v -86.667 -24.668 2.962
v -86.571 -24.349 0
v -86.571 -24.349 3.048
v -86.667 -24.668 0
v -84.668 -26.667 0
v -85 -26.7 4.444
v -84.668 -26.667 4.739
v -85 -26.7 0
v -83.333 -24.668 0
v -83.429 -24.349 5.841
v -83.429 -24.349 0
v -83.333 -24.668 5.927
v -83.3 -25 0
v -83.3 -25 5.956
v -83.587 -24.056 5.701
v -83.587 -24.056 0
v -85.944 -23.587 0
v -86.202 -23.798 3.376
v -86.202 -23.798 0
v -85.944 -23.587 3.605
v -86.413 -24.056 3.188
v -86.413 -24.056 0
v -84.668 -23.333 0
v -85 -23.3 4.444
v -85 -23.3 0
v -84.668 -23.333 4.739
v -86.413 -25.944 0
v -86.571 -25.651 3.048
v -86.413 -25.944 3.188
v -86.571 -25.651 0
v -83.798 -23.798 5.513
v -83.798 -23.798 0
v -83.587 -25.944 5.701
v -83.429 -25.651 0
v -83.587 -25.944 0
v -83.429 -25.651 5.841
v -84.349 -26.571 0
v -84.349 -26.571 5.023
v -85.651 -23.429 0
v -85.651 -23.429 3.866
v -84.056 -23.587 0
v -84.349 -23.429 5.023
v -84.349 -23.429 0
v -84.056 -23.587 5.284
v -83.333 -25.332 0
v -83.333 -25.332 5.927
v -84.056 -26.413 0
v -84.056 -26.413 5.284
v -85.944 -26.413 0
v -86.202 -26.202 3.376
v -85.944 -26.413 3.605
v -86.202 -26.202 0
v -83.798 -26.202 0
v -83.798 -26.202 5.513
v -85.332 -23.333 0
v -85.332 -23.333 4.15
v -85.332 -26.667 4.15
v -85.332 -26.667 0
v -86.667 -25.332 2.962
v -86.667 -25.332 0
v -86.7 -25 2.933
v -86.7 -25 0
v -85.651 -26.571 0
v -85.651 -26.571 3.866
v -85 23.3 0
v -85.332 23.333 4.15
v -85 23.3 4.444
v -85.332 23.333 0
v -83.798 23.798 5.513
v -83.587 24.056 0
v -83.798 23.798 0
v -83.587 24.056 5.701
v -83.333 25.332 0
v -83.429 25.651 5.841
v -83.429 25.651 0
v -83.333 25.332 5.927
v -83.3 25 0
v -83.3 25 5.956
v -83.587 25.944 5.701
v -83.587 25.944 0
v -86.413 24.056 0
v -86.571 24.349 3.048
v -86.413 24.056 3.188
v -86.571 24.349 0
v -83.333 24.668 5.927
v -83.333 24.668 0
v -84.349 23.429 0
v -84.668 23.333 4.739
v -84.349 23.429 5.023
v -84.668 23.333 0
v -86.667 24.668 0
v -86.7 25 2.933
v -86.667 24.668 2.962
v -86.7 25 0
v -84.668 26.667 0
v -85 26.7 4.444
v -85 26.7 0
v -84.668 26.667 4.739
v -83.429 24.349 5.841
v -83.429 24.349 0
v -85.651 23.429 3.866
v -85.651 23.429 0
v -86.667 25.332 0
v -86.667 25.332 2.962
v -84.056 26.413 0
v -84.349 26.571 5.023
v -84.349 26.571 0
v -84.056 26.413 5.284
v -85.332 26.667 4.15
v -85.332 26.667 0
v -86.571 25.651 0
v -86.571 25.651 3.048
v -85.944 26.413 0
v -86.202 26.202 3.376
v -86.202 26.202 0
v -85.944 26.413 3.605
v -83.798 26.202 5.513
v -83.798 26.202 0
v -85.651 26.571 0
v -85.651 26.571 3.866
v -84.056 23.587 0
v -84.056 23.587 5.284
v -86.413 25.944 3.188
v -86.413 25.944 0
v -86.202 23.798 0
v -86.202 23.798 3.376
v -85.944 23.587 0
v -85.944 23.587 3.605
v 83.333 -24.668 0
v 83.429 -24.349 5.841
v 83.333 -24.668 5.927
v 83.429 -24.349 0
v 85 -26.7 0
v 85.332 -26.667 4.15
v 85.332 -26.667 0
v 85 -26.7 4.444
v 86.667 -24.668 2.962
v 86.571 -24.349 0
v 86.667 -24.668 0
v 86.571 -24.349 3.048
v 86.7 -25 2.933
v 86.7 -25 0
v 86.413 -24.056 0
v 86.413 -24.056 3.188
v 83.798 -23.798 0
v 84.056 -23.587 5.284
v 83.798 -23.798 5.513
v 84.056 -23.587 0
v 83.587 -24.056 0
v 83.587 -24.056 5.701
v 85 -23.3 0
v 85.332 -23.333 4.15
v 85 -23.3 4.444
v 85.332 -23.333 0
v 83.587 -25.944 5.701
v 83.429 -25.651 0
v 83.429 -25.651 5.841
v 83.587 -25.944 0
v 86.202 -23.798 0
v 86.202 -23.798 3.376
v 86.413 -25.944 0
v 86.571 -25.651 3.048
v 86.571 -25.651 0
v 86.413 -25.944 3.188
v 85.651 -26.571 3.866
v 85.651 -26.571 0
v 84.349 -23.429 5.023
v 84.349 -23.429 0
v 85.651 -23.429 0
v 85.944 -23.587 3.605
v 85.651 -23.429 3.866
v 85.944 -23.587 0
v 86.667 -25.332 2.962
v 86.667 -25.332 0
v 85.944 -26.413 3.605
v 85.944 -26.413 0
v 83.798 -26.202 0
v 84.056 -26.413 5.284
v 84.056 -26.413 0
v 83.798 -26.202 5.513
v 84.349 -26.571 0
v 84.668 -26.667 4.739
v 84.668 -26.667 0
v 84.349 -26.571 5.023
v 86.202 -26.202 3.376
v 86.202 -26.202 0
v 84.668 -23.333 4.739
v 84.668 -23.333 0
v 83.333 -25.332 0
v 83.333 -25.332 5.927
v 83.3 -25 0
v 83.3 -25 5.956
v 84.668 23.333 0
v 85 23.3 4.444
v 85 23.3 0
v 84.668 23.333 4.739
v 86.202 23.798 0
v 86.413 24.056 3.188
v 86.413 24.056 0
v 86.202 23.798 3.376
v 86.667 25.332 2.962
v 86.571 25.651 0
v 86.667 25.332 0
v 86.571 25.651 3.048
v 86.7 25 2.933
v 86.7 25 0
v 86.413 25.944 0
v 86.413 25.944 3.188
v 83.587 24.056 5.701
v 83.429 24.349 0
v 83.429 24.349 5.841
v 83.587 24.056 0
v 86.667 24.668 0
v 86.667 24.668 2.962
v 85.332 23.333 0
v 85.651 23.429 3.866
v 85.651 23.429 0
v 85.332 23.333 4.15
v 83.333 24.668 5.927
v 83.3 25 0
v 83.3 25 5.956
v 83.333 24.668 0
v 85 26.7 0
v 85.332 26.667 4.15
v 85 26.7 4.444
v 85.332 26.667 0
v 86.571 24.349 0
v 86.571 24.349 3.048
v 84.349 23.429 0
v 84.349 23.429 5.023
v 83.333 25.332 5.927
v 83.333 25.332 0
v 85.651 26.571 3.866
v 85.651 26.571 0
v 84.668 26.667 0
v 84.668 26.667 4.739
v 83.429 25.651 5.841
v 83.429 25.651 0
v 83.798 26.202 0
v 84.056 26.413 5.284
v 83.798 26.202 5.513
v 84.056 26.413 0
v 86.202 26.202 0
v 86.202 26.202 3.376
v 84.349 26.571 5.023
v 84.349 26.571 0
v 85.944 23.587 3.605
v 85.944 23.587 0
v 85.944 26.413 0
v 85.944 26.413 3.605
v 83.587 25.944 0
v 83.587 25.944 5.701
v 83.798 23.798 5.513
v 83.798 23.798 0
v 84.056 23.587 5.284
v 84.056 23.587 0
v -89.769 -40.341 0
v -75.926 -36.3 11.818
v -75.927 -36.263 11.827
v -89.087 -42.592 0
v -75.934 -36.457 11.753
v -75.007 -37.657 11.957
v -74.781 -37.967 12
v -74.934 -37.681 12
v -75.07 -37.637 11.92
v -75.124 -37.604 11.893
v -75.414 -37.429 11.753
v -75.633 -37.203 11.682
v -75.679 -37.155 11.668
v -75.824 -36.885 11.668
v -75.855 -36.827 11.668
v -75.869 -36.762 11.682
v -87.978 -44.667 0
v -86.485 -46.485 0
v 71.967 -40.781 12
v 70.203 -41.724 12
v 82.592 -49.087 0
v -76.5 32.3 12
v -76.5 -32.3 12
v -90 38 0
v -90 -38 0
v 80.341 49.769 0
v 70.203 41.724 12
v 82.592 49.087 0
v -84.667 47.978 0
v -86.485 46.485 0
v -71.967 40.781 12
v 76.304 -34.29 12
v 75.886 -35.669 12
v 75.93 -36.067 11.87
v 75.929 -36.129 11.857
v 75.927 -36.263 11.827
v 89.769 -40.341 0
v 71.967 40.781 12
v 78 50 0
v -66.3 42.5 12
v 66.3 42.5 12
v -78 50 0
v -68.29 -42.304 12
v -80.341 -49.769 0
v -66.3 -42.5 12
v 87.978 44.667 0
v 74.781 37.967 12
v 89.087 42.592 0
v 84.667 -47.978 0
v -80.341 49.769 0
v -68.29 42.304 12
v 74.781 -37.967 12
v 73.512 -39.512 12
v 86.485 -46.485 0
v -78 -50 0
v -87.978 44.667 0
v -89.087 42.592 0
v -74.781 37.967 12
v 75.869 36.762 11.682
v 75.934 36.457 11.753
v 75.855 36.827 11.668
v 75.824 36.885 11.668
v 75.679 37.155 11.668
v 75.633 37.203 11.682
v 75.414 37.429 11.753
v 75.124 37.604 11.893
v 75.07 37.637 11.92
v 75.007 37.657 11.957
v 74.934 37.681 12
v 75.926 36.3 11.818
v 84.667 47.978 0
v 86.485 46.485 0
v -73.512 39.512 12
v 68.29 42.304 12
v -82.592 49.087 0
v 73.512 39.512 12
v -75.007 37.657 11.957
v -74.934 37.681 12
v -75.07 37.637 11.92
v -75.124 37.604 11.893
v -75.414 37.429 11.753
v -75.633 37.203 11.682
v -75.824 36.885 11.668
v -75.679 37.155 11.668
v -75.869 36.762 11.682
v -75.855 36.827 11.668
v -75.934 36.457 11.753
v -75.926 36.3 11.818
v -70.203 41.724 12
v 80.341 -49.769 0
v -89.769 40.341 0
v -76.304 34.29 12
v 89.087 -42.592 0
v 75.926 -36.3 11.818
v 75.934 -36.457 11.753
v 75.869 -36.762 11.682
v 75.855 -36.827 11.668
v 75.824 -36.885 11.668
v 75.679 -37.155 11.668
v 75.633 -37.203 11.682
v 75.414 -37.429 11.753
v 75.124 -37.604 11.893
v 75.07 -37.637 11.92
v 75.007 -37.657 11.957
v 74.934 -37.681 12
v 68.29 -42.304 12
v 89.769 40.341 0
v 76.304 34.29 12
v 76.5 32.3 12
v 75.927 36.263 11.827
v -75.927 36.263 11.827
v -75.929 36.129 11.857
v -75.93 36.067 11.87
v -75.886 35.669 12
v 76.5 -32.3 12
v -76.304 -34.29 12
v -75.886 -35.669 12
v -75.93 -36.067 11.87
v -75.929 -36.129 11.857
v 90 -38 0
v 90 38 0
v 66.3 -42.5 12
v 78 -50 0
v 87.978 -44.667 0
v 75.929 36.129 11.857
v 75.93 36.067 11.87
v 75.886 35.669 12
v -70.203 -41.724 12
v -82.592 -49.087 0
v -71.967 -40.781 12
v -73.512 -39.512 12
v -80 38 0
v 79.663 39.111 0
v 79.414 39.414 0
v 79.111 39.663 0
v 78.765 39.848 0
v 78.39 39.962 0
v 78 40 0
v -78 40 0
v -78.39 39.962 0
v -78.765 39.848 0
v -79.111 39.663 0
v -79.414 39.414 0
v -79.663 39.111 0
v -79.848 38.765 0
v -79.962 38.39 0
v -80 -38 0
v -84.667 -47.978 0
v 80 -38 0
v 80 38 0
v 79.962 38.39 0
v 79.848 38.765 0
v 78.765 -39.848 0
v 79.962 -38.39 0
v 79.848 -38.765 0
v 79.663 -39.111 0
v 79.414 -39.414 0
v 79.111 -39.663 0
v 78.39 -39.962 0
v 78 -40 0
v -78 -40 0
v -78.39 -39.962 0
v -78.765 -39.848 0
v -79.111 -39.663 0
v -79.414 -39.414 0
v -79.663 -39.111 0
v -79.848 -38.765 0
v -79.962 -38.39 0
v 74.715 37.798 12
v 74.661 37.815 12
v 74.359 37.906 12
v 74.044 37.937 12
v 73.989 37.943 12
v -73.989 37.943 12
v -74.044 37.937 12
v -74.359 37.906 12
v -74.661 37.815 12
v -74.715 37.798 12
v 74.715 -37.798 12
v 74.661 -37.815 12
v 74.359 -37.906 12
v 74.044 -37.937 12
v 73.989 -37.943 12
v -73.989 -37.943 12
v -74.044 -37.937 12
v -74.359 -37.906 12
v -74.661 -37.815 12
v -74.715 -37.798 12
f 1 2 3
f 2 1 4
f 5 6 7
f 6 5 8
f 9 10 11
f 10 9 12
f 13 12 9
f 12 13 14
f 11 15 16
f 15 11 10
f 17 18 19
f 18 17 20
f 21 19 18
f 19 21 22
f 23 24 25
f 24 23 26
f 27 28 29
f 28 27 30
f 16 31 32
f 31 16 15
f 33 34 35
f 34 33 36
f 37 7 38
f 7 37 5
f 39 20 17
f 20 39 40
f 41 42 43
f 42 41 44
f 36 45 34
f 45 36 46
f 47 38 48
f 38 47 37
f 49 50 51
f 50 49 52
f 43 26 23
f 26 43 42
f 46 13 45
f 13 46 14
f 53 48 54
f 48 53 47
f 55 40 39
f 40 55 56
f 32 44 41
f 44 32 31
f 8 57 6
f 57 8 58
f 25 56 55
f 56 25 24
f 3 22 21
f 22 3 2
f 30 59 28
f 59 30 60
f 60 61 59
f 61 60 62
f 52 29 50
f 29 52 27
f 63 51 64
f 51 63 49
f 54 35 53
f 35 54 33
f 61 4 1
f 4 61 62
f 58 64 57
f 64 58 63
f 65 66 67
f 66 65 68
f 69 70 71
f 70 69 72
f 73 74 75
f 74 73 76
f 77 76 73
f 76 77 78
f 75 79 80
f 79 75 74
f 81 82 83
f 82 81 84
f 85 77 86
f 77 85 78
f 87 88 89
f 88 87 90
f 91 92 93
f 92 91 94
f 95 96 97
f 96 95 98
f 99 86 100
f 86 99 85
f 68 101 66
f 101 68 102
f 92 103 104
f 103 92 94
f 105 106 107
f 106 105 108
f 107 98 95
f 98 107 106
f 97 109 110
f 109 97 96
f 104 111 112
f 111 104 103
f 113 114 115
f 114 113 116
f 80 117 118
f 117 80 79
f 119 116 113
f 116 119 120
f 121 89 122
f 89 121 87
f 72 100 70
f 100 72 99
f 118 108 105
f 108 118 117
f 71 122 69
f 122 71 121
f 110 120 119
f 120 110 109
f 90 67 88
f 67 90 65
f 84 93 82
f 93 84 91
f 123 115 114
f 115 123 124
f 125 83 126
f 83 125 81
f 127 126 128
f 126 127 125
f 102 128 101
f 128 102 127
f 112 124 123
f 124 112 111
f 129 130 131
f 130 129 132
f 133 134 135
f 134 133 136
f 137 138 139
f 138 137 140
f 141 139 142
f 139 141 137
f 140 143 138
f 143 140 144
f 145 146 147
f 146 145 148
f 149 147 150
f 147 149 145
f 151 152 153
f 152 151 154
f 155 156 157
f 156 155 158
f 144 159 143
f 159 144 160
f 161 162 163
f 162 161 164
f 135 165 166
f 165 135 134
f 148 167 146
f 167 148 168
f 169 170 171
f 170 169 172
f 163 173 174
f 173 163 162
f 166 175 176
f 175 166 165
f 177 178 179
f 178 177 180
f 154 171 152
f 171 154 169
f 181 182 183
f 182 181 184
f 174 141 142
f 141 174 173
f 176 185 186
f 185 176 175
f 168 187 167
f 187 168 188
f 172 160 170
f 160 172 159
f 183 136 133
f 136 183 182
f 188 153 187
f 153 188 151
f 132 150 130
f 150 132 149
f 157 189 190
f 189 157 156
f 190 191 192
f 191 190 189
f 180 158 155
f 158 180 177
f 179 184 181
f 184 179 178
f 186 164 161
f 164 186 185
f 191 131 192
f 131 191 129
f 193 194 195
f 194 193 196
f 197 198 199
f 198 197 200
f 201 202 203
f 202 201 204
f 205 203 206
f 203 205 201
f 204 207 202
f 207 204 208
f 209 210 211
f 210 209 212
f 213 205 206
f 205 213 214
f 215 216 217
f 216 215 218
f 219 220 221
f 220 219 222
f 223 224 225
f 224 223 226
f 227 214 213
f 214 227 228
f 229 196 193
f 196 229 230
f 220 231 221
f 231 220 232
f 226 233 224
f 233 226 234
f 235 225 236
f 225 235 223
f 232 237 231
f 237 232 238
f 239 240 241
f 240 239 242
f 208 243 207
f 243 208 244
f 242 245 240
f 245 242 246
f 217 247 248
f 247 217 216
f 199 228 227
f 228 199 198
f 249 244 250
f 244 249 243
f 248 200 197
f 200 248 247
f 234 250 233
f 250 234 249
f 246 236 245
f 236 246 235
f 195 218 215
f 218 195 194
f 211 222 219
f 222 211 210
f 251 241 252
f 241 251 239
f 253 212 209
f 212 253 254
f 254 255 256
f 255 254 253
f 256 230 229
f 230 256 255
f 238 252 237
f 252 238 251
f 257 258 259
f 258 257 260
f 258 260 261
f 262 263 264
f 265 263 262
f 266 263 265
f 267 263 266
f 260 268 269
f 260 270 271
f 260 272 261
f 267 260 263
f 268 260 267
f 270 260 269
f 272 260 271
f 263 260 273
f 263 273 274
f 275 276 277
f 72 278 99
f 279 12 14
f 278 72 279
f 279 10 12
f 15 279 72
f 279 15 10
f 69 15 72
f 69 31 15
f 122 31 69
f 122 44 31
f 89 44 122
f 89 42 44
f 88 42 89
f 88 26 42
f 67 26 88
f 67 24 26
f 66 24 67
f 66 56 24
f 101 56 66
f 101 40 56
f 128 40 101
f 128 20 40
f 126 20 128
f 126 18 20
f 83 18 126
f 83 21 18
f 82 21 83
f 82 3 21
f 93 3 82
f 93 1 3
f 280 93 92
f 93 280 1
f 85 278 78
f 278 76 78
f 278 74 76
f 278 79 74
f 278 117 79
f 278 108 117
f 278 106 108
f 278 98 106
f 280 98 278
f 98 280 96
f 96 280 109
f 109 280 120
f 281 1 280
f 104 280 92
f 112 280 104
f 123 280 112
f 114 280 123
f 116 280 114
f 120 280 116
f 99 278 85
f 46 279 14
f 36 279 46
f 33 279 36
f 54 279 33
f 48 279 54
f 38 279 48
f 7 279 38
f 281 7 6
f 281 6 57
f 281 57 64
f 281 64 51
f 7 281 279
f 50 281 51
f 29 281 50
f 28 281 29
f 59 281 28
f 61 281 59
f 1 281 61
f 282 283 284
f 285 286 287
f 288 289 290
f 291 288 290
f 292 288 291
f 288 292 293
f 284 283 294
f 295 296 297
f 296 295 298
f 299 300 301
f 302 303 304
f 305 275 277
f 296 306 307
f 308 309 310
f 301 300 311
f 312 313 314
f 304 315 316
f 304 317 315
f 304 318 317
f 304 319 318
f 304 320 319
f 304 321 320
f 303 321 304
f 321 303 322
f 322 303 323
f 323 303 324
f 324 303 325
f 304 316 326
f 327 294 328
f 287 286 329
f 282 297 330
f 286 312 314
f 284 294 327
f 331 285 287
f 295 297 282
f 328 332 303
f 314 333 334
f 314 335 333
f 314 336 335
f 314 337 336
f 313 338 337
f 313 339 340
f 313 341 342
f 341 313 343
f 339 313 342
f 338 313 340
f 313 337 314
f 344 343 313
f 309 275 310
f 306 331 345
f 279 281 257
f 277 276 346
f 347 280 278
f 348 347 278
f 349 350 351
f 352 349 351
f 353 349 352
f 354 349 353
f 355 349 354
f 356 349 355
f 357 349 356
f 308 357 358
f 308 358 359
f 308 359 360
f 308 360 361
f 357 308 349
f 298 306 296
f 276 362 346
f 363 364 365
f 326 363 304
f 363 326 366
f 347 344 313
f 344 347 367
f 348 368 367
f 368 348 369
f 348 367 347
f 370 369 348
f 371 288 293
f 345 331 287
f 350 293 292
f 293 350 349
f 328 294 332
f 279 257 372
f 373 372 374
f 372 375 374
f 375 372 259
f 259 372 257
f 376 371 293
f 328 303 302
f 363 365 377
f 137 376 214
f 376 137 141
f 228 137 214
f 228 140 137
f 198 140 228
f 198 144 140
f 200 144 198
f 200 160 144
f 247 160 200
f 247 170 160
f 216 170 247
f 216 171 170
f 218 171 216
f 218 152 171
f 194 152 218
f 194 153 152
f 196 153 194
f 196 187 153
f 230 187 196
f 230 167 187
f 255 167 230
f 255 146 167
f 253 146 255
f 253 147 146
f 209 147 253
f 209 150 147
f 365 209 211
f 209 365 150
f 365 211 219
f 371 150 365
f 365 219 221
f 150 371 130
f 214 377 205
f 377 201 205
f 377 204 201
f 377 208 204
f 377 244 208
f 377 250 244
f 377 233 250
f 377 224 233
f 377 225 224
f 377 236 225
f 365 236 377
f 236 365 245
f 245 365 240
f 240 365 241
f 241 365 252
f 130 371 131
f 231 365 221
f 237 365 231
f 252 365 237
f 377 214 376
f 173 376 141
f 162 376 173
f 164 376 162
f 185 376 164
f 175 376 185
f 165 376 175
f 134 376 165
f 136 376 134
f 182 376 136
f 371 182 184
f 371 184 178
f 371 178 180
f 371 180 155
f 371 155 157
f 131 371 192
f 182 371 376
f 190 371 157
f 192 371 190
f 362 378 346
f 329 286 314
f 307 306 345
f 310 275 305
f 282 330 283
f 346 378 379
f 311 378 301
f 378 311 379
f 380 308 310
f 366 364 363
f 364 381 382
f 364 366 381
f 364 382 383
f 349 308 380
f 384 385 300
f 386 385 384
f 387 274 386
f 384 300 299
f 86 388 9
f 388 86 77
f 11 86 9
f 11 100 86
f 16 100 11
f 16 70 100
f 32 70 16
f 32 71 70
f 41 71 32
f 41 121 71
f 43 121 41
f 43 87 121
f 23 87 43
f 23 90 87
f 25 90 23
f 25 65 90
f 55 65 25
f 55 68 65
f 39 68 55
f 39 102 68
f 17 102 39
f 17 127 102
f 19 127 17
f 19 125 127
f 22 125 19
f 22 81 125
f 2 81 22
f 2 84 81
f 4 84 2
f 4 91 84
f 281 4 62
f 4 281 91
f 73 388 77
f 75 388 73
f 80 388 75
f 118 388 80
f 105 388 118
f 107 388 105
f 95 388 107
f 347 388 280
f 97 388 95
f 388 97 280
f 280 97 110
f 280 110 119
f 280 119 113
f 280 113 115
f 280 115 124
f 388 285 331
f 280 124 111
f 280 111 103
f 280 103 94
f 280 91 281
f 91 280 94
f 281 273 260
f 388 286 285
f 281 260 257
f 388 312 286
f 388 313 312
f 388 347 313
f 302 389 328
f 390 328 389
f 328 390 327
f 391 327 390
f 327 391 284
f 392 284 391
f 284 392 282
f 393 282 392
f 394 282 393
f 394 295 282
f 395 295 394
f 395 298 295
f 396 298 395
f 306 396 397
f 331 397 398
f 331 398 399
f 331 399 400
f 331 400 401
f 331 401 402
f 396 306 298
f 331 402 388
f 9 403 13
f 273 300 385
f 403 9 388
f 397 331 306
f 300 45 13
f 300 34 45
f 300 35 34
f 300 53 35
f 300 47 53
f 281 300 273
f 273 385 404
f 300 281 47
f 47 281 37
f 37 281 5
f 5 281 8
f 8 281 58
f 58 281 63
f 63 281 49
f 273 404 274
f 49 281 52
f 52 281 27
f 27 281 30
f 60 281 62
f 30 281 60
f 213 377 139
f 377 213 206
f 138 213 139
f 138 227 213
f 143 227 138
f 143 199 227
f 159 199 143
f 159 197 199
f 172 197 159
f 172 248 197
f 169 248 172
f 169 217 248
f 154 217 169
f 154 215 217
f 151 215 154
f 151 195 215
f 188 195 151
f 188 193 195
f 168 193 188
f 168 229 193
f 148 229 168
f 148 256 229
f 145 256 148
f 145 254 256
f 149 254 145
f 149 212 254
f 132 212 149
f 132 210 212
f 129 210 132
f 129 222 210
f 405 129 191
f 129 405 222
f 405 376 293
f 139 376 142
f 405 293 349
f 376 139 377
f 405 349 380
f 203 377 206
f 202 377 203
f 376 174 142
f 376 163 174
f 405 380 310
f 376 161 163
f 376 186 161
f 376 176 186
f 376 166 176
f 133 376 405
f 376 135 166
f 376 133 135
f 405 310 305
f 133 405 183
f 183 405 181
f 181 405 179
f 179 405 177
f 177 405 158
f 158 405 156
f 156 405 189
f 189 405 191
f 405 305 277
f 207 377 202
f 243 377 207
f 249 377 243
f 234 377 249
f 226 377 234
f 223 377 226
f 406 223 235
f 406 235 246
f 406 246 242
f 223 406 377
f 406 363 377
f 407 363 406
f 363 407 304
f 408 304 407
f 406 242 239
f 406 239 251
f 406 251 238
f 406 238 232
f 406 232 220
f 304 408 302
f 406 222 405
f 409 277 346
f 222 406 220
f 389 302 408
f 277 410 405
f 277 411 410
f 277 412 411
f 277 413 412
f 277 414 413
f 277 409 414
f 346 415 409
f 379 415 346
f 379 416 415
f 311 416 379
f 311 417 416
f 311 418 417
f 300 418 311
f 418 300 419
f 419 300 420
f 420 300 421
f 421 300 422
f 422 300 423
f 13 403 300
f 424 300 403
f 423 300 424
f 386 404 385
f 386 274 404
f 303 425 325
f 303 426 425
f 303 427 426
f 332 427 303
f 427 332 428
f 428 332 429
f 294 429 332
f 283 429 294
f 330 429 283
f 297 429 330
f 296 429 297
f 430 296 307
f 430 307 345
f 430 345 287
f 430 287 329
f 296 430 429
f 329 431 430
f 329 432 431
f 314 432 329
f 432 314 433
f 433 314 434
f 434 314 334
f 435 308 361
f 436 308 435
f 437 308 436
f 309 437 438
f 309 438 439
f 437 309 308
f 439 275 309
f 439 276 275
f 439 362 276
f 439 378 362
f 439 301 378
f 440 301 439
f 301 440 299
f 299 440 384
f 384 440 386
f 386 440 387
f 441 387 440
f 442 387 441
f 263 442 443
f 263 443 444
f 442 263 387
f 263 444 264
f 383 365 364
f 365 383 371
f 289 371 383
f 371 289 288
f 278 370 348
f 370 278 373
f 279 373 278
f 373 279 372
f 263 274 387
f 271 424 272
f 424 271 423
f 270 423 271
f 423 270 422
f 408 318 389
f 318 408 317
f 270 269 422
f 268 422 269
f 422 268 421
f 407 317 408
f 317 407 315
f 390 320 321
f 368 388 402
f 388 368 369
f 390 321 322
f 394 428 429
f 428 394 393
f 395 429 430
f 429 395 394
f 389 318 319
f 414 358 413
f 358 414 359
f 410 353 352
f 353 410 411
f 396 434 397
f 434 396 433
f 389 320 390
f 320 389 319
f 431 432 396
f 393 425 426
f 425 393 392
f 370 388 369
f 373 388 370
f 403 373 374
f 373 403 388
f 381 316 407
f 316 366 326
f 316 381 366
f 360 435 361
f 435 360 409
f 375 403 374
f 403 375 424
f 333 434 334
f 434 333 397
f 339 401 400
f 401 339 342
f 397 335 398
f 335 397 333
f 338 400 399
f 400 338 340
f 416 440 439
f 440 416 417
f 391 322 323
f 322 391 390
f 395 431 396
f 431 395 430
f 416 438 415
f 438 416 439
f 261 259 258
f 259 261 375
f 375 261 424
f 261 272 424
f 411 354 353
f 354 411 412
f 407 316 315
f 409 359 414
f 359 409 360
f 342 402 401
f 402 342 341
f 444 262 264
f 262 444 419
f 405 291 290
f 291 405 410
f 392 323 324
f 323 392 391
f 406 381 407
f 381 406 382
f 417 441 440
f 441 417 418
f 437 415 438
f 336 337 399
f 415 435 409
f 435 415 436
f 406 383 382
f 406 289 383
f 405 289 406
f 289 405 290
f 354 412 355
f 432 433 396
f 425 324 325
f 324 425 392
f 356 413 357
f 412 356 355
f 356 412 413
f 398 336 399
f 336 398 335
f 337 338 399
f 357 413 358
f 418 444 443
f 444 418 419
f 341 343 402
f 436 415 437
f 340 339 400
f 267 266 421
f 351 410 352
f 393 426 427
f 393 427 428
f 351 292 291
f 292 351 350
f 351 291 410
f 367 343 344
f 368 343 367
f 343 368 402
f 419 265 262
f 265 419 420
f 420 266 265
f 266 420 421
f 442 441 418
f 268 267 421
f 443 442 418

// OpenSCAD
$fn = 32;

// ----------------------------------------------------------------------
// Display bezel: 180 x 100 mm frame, opening 160x80 mm
// ----------------------------------------------------------------------

// --- parameters (mm) ---
length = 180;             // frame outside length, X
width = 100;              // frame outside width, Y
frame_w = 10;             // frame width
thickness = 12;           // frame thickness
corner_r = 12;            // outside corner radius
chamfer = 0.85;           // outer wall taper
funnel = 0.94;            // inner opening taper
opening_l = 160;          // opening length
opening_w = 80;           // opening width
inner_r = 2;              // opening corner radius
hole_d = 3.4;             // mounting screw clearance
holes_per_side = 2;       // holes per short side
hole_inset = 5;           // hole centre inset from the outside edge

/* rounded-rectangle outlines, generated with loops */
module rounded_ring(l_nom, w_nom, r) {
  hull() {
    for (sx = [-1, 1]) for (sy = [-1, 1])
      translate([sx * (l_nom / 2 - r), sy * (w_nom / 2 - r)]) circle(r = r);
  }
}

difference() {
  /* frame body, drafted so the outer edge is a variable-depth chamfer */
  linear_extrude(height = thickness, scale = chamfer)
    rounded_ring(length, width, corner_r);
  /* viewing opening, drafted the other way for a funnel edge */
  linear_extrude(height = thickness + 2, scale = funnel)
    translate([0, 0, -1]) rounded_ring(opening_l, opening_w, inner_r);
  /* mounting screws through the frame lands */
  for (sx = [-1, 1]) for (i = [1 : holes_per_side])
    translate([sx * (length / 2 - hole_inset),
               (i - (holes_per_side + 1) / 2) * width * 0.5, -1])
      cylinder(h = thickness + 2, d = hole_d);
}
